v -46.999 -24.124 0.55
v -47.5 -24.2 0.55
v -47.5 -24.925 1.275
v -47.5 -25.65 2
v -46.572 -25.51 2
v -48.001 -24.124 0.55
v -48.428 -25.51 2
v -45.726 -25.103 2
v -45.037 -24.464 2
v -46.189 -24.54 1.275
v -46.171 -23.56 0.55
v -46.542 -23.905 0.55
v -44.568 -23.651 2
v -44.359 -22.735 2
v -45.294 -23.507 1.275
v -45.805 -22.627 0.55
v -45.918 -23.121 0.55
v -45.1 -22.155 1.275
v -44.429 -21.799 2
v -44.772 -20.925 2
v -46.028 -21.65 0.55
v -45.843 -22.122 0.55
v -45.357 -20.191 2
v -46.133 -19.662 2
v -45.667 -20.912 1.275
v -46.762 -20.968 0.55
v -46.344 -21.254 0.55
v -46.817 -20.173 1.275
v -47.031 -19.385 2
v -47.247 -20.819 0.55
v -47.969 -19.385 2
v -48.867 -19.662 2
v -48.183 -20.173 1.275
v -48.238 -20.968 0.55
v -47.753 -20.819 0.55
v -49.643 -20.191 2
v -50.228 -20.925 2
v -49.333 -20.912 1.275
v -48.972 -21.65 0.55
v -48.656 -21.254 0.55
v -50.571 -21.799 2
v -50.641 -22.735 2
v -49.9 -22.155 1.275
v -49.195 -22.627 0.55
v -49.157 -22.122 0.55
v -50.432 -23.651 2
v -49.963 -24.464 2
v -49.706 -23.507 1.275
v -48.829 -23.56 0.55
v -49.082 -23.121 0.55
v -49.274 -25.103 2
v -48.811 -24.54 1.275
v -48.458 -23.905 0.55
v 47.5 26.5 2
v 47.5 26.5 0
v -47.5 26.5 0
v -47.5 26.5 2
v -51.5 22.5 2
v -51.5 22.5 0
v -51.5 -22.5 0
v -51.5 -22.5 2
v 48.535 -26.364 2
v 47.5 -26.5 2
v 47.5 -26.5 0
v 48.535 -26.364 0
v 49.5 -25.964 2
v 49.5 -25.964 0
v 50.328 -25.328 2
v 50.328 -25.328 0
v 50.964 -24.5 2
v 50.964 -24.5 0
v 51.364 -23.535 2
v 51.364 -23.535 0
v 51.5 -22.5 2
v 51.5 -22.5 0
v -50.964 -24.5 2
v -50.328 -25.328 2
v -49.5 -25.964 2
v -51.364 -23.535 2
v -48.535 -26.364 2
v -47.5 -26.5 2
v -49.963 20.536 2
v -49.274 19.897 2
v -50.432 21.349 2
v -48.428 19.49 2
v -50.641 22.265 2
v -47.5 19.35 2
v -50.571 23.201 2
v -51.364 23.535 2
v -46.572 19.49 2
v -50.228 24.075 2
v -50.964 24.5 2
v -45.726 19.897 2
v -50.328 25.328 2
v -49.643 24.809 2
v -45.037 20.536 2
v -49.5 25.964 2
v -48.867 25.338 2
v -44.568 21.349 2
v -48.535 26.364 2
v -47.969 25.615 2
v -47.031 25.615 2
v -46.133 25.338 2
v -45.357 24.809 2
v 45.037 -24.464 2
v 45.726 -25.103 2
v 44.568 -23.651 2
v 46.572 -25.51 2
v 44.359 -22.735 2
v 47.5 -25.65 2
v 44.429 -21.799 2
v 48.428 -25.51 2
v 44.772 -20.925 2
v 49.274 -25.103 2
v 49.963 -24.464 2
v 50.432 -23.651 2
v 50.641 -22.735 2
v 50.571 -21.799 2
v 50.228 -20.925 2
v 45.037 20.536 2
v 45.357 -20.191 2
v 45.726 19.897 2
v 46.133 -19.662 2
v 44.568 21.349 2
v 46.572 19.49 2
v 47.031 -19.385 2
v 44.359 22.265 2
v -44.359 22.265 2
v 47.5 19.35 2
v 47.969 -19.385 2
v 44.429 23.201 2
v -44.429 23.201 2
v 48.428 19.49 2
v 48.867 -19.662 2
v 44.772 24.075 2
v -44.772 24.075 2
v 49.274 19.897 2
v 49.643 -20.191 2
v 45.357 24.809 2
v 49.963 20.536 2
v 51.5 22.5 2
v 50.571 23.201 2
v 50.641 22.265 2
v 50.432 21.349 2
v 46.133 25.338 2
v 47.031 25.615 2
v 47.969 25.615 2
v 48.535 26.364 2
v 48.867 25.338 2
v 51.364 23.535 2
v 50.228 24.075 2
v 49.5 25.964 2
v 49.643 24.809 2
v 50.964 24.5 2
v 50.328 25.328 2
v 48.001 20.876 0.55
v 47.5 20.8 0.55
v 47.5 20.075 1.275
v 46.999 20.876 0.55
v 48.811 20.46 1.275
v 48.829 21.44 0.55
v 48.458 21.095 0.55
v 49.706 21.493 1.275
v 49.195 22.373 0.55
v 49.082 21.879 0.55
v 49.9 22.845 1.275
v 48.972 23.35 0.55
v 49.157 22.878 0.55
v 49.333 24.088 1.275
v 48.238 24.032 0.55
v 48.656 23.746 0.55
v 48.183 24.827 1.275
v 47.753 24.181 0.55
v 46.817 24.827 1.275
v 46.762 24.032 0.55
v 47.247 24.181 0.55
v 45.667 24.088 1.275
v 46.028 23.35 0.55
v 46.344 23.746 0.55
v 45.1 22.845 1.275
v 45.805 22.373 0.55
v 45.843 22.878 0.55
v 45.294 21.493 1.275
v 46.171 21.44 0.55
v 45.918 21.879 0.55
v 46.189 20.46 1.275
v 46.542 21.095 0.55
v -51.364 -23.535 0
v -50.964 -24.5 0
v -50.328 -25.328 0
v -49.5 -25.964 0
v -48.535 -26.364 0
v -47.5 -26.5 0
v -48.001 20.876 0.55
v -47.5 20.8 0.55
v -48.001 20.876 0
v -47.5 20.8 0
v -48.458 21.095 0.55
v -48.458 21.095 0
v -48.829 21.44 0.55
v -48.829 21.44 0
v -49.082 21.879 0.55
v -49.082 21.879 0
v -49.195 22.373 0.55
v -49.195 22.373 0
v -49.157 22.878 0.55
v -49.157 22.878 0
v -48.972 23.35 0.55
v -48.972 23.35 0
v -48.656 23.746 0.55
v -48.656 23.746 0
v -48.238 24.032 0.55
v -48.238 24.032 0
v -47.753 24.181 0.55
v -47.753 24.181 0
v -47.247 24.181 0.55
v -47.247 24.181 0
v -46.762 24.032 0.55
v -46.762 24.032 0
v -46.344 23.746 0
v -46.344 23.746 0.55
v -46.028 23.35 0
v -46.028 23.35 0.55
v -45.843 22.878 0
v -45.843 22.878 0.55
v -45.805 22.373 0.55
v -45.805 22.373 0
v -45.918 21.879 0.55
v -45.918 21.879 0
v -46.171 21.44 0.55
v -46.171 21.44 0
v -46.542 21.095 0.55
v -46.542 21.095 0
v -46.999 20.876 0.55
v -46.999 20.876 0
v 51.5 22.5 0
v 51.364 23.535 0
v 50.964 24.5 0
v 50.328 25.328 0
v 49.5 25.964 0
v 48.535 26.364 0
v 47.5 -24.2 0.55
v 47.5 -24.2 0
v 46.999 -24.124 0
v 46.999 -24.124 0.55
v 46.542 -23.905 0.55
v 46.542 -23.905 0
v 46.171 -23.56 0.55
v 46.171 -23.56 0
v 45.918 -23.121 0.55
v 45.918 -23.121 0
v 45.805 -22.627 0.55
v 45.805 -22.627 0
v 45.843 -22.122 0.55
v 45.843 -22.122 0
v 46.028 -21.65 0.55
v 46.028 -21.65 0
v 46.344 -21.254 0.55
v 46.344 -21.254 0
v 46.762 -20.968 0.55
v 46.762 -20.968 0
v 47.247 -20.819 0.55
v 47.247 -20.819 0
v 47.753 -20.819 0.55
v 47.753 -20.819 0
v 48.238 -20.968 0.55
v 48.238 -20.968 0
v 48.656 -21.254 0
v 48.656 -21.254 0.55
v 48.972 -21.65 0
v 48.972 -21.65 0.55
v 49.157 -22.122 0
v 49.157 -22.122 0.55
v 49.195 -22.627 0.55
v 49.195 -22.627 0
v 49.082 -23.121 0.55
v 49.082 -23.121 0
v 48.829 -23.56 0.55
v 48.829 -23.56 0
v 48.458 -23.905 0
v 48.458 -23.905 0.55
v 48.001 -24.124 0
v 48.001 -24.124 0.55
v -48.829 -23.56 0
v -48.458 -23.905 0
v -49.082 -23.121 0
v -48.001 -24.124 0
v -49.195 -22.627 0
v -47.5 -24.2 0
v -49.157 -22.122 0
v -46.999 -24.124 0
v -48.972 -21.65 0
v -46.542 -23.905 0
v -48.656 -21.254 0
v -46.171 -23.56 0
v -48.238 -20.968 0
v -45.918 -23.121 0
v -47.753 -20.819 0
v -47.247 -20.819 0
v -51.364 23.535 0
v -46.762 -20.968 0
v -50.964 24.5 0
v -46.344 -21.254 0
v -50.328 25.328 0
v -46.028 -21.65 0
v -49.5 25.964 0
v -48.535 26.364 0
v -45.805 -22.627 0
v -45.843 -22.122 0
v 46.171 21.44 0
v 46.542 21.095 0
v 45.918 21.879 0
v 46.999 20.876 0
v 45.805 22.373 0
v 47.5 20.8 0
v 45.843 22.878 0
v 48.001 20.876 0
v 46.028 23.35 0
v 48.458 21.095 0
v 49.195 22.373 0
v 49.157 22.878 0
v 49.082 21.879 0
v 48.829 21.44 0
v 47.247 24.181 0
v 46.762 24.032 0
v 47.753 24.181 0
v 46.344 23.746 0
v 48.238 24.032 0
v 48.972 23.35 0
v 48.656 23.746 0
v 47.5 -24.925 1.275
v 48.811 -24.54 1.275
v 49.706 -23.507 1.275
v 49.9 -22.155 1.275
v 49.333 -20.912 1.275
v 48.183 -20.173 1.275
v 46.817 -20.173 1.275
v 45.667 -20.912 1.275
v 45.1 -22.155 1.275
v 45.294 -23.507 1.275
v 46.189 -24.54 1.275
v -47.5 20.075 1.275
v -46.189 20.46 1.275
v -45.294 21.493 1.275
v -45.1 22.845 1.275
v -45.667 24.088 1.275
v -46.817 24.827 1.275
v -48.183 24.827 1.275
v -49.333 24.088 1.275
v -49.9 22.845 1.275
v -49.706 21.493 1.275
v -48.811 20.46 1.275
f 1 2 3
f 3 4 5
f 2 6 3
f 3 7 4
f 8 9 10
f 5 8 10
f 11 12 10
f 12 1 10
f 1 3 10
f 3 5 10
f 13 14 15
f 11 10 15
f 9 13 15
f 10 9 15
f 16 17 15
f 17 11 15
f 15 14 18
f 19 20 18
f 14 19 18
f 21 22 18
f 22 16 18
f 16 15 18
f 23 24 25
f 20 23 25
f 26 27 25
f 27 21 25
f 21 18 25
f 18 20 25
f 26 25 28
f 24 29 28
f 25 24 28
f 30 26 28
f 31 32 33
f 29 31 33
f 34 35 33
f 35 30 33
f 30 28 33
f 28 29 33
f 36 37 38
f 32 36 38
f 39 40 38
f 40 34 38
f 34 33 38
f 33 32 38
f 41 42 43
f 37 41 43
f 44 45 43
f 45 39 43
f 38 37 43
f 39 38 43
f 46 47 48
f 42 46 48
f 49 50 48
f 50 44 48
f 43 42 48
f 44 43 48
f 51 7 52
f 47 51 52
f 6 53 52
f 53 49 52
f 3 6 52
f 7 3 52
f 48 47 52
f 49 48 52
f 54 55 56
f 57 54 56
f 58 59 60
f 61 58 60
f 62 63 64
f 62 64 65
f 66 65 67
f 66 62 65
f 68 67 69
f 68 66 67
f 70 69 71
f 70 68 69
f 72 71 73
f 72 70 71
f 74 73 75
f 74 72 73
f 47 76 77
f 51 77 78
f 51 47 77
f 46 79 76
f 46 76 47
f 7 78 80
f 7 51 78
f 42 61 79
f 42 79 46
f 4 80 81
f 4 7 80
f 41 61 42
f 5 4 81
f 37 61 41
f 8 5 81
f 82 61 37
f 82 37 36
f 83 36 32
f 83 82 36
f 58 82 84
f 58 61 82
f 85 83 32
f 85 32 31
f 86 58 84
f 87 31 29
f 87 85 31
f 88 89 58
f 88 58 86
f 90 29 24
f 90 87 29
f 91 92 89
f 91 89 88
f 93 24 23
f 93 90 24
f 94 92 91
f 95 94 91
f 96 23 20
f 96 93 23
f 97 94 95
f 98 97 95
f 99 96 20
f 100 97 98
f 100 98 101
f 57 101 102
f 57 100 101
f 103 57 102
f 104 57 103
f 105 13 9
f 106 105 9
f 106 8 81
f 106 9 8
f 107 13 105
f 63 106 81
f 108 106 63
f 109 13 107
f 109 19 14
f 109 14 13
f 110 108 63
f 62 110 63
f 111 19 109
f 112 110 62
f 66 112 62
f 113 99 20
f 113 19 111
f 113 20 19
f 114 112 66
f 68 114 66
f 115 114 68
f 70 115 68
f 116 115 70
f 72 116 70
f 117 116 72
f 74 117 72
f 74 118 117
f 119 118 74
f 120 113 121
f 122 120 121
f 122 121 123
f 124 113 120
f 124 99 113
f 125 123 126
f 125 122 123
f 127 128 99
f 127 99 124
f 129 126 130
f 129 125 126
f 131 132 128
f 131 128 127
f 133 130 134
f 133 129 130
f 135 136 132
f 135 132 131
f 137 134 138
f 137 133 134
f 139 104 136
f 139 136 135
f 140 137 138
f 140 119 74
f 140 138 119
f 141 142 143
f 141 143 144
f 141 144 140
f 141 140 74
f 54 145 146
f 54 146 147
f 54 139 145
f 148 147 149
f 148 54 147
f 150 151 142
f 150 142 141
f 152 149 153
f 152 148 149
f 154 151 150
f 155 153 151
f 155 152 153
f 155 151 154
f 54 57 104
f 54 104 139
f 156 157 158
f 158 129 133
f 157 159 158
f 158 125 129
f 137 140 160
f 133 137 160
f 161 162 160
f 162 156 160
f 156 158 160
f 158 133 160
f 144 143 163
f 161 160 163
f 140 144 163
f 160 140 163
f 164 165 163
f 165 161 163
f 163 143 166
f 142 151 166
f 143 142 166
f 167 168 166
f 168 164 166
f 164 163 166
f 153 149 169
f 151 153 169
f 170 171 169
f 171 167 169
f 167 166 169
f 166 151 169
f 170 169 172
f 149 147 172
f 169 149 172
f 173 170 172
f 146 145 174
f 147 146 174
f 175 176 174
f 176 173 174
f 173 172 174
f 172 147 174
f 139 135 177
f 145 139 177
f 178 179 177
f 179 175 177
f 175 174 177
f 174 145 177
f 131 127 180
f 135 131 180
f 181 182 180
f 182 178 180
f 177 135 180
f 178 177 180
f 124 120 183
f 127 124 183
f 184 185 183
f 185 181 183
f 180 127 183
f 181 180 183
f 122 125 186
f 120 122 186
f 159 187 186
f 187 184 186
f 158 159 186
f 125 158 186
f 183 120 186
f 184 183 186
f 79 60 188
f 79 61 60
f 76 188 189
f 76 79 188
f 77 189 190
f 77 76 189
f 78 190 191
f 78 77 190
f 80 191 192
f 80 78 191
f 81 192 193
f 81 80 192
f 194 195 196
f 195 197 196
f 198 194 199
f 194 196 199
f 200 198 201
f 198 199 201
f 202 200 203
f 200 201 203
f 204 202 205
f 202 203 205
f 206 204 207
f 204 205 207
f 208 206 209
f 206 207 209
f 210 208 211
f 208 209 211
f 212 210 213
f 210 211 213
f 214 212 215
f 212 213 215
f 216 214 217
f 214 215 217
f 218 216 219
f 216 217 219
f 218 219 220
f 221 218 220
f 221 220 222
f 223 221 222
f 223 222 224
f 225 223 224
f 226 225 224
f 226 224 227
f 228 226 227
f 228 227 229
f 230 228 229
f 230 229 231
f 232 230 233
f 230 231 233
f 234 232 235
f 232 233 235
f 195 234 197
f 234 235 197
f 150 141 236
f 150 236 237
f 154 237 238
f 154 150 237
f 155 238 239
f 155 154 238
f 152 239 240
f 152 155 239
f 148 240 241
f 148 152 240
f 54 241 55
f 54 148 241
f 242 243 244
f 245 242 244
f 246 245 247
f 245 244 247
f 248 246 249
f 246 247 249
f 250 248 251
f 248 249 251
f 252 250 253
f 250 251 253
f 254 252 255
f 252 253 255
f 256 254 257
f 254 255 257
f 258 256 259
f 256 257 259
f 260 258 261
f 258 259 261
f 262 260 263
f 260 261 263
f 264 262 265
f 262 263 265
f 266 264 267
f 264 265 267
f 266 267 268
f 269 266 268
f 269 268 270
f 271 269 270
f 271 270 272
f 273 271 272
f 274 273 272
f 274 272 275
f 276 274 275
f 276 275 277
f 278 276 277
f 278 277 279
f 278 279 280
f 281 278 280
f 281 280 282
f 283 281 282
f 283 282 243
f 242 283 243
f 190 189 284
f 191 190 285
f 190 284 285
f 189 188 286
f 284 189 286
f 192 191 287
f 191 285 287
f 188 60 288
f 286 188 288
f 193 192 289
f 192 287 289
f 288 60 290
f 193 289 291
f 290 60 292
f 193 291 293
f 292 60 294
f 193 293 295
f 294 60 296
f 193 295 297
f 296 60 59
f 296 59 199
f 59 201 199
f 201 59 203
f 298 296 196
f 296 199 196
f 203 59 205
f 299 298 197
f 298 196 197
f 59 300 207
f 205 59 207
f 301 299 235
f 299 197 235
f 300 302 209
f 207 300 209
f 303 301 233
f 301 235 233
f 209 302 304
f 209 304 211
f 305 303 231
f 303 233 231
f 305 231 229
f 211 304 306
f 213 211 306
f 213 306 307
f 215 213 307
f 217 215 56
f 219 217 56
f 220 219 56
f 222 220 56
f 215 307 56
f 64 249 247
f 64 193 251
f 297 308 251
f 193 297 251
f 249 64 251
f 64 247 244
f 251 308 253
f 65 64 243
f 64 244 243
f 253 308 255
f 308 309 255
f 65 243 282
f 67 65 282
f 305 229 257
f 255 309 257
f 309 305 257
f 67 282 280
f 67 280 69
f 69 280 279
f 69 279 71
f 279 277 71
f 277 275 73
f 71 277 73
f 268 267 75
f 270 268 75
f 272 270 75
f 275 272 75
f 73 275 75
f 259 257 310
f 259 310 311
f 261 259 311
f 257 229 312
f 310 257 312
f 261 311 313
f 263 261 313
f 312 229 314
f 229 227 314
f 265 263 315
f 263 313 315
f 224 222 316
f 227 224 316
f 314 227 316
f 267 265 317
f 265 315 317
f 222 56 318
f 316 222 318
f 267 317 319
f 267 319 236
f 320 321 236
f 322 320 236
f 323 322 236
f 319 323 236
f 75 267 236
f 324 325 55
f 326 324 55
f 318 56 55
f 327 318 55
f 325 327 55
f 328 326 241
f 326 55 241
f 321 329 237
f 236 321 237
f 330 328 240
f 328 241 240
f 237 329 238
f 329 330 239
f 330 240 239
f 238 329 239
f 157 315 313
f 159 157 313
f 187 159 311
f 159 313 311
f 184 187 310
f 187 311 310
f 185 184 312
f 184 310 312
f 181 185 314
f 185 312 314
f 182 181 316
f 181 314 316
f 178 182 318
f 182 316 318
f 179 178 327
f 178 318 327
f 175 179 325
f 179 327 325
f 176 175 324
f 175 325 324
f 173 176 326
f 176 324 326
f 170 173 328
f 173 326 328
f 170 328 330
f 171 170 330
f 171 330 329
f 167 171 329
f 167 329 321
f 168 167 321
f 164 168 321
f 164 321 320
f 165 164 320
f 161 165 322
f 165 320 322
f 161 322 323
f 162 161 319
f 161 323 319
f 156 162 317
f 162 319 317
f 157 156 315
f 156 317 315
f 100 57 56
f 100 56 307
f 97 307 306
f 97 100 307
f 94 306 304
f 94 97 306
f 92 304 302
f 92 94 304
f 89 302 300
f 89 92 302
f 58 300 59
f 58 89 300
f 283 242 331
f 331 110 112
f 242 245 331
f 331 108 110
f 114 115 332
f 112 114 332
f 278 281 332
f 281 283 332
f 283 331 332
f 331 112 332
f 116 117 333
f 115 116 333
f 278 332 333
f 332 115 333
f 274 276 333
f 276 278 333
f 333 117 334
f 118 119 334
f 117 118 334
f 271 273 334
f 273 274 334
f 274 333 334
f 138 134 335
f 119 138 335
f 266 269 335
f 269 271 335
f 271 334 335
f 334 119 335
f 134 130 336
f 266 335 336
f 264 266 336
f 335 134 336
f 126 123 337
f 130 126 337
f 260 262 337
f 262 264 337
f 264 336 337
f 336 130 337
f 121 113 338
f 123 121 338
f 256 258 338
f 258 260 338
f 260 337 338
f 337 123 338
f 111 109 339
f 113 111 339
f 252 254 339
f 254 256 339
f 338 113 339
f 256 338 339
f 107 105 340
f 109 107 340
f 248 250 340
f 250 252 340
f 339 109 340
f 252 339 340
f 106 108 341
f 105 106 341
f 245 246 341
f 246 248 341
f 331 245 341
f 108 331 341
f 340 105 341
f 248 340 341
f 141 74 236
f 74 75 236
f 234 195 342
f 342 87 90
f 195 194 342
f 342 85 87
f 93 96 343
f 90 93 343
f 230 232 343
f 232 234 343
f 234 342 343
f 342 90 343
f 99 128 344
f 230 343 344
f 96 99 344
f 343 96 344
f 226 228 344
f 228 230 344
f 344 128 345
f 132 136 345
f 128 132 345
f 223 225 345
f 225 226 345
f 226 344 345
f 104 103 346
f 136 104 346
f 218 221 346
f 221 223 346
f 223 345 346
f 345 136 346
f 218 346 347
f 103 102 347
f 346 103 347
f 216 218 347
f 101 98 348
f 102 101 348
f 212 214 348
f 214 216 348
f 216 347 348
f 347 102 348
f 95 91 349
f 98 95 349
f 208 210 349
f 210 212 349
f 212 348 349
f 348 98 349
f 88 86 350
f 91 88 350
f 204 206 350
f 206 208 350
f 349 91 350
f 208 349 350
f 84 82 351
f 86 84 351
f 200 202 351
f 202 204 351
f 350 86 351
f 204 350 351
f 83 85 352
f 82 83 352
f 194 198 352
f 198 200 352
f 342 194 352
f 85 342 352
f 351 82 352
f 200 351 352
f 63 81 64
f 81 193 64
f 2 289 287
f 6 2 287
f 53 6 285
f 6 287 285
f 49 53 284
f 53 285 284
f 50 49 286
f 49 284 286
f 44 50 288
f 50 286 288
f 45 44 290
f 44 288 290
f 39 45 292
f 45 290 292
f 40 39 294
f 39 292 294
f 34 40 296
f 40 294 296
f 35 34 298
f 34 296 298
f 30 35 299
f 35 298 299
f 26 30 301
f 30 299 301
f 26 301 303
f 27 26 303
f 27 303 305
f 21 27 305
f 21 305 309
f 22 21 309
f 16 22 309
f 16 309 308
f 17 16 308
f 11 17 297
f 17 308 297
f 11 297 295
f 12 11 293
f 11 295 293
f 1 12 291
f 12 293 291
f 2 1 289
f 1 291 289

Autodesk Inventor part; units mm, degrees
ref_plane "YZ Plane" through (0, 0, 0) normal (1, 0, 0) x (0, 1, 0)
ref_plane "XZ Plane" through (0, 0, 0) normal (0, 1, 0) x (-1, 0, 0)
ref_plane "XY Plane" through (0, 0, 0) normal (0, 0, 1) x (1, 0, 0)
sketch "Sketch1" plane through (0, 0, 0) normal (0, 0, 1) x (1, 0, 0)
  line L0 (-51.5, -26.5) -> (51.5, -26.5)
  line L1 (51.5, -26.5) -> (51.5, 26.5)
  line L2 (51.5, 26.5) -> (-51.5, 26.5)
  line L3 (-51.5, 26.5) -> (-51.5, -26.5)
  line L4 (-51.5, -26.5) -> (51.5, 26.5) construction
  line L5 (51.5, -26.5) -> (-51.5, 26.5) construction
  point P0 (0, 0)
  dimension "d0" = 103
  dimension "d1" = 53
extrude "Extrusion1" add sketch "Sketch1" along normal blind 2
fillet "Fillet1" radius 4 4 edges at (-51.5, -26.5, 1) (-51.5, 26.5, 1) (51.5, -26.5, 1) (51.5, 26.5, 1)
sketch "Sketch2" plane through (0, 0, 2) normal (0, 0, 1) x (1, 0, 0)
  line L0 (-47.5, -22.5) -> (47.5, -22.5) construction
  line L1 (47.5, -22.5) -> (47.5, 22.5) construction
  line L2 (47.5, 22.5) -> (-47.5, 22.5) construction
  line L3 (-47.5, 22.5) -> (-47.5, -22.5) construction
  line L4 (-47.5, -22.5) -> (47.5, 22.5) construction
  line L5 (47.5, -22.5) -> (-47.5, 22.5) construction
  point P0 (0, 0)
  dimension "d5" = 95
  dimension "d6" = 45
hole "Hole1" at (-47.5, 22.5, 2) at (-47.5, -22.5, 2) at (47.5, -22.5, 2) at (47.5, 22.5, 2) direction (0, 0, -1) diameter 3.4 end through all countersink diameter 6.3 countersink angle 90 clearance for "Countersunk Flat Head Screw DIN EN ISO 2009" size "M3" standard "DIN"
properties part number "Frontplatte"
